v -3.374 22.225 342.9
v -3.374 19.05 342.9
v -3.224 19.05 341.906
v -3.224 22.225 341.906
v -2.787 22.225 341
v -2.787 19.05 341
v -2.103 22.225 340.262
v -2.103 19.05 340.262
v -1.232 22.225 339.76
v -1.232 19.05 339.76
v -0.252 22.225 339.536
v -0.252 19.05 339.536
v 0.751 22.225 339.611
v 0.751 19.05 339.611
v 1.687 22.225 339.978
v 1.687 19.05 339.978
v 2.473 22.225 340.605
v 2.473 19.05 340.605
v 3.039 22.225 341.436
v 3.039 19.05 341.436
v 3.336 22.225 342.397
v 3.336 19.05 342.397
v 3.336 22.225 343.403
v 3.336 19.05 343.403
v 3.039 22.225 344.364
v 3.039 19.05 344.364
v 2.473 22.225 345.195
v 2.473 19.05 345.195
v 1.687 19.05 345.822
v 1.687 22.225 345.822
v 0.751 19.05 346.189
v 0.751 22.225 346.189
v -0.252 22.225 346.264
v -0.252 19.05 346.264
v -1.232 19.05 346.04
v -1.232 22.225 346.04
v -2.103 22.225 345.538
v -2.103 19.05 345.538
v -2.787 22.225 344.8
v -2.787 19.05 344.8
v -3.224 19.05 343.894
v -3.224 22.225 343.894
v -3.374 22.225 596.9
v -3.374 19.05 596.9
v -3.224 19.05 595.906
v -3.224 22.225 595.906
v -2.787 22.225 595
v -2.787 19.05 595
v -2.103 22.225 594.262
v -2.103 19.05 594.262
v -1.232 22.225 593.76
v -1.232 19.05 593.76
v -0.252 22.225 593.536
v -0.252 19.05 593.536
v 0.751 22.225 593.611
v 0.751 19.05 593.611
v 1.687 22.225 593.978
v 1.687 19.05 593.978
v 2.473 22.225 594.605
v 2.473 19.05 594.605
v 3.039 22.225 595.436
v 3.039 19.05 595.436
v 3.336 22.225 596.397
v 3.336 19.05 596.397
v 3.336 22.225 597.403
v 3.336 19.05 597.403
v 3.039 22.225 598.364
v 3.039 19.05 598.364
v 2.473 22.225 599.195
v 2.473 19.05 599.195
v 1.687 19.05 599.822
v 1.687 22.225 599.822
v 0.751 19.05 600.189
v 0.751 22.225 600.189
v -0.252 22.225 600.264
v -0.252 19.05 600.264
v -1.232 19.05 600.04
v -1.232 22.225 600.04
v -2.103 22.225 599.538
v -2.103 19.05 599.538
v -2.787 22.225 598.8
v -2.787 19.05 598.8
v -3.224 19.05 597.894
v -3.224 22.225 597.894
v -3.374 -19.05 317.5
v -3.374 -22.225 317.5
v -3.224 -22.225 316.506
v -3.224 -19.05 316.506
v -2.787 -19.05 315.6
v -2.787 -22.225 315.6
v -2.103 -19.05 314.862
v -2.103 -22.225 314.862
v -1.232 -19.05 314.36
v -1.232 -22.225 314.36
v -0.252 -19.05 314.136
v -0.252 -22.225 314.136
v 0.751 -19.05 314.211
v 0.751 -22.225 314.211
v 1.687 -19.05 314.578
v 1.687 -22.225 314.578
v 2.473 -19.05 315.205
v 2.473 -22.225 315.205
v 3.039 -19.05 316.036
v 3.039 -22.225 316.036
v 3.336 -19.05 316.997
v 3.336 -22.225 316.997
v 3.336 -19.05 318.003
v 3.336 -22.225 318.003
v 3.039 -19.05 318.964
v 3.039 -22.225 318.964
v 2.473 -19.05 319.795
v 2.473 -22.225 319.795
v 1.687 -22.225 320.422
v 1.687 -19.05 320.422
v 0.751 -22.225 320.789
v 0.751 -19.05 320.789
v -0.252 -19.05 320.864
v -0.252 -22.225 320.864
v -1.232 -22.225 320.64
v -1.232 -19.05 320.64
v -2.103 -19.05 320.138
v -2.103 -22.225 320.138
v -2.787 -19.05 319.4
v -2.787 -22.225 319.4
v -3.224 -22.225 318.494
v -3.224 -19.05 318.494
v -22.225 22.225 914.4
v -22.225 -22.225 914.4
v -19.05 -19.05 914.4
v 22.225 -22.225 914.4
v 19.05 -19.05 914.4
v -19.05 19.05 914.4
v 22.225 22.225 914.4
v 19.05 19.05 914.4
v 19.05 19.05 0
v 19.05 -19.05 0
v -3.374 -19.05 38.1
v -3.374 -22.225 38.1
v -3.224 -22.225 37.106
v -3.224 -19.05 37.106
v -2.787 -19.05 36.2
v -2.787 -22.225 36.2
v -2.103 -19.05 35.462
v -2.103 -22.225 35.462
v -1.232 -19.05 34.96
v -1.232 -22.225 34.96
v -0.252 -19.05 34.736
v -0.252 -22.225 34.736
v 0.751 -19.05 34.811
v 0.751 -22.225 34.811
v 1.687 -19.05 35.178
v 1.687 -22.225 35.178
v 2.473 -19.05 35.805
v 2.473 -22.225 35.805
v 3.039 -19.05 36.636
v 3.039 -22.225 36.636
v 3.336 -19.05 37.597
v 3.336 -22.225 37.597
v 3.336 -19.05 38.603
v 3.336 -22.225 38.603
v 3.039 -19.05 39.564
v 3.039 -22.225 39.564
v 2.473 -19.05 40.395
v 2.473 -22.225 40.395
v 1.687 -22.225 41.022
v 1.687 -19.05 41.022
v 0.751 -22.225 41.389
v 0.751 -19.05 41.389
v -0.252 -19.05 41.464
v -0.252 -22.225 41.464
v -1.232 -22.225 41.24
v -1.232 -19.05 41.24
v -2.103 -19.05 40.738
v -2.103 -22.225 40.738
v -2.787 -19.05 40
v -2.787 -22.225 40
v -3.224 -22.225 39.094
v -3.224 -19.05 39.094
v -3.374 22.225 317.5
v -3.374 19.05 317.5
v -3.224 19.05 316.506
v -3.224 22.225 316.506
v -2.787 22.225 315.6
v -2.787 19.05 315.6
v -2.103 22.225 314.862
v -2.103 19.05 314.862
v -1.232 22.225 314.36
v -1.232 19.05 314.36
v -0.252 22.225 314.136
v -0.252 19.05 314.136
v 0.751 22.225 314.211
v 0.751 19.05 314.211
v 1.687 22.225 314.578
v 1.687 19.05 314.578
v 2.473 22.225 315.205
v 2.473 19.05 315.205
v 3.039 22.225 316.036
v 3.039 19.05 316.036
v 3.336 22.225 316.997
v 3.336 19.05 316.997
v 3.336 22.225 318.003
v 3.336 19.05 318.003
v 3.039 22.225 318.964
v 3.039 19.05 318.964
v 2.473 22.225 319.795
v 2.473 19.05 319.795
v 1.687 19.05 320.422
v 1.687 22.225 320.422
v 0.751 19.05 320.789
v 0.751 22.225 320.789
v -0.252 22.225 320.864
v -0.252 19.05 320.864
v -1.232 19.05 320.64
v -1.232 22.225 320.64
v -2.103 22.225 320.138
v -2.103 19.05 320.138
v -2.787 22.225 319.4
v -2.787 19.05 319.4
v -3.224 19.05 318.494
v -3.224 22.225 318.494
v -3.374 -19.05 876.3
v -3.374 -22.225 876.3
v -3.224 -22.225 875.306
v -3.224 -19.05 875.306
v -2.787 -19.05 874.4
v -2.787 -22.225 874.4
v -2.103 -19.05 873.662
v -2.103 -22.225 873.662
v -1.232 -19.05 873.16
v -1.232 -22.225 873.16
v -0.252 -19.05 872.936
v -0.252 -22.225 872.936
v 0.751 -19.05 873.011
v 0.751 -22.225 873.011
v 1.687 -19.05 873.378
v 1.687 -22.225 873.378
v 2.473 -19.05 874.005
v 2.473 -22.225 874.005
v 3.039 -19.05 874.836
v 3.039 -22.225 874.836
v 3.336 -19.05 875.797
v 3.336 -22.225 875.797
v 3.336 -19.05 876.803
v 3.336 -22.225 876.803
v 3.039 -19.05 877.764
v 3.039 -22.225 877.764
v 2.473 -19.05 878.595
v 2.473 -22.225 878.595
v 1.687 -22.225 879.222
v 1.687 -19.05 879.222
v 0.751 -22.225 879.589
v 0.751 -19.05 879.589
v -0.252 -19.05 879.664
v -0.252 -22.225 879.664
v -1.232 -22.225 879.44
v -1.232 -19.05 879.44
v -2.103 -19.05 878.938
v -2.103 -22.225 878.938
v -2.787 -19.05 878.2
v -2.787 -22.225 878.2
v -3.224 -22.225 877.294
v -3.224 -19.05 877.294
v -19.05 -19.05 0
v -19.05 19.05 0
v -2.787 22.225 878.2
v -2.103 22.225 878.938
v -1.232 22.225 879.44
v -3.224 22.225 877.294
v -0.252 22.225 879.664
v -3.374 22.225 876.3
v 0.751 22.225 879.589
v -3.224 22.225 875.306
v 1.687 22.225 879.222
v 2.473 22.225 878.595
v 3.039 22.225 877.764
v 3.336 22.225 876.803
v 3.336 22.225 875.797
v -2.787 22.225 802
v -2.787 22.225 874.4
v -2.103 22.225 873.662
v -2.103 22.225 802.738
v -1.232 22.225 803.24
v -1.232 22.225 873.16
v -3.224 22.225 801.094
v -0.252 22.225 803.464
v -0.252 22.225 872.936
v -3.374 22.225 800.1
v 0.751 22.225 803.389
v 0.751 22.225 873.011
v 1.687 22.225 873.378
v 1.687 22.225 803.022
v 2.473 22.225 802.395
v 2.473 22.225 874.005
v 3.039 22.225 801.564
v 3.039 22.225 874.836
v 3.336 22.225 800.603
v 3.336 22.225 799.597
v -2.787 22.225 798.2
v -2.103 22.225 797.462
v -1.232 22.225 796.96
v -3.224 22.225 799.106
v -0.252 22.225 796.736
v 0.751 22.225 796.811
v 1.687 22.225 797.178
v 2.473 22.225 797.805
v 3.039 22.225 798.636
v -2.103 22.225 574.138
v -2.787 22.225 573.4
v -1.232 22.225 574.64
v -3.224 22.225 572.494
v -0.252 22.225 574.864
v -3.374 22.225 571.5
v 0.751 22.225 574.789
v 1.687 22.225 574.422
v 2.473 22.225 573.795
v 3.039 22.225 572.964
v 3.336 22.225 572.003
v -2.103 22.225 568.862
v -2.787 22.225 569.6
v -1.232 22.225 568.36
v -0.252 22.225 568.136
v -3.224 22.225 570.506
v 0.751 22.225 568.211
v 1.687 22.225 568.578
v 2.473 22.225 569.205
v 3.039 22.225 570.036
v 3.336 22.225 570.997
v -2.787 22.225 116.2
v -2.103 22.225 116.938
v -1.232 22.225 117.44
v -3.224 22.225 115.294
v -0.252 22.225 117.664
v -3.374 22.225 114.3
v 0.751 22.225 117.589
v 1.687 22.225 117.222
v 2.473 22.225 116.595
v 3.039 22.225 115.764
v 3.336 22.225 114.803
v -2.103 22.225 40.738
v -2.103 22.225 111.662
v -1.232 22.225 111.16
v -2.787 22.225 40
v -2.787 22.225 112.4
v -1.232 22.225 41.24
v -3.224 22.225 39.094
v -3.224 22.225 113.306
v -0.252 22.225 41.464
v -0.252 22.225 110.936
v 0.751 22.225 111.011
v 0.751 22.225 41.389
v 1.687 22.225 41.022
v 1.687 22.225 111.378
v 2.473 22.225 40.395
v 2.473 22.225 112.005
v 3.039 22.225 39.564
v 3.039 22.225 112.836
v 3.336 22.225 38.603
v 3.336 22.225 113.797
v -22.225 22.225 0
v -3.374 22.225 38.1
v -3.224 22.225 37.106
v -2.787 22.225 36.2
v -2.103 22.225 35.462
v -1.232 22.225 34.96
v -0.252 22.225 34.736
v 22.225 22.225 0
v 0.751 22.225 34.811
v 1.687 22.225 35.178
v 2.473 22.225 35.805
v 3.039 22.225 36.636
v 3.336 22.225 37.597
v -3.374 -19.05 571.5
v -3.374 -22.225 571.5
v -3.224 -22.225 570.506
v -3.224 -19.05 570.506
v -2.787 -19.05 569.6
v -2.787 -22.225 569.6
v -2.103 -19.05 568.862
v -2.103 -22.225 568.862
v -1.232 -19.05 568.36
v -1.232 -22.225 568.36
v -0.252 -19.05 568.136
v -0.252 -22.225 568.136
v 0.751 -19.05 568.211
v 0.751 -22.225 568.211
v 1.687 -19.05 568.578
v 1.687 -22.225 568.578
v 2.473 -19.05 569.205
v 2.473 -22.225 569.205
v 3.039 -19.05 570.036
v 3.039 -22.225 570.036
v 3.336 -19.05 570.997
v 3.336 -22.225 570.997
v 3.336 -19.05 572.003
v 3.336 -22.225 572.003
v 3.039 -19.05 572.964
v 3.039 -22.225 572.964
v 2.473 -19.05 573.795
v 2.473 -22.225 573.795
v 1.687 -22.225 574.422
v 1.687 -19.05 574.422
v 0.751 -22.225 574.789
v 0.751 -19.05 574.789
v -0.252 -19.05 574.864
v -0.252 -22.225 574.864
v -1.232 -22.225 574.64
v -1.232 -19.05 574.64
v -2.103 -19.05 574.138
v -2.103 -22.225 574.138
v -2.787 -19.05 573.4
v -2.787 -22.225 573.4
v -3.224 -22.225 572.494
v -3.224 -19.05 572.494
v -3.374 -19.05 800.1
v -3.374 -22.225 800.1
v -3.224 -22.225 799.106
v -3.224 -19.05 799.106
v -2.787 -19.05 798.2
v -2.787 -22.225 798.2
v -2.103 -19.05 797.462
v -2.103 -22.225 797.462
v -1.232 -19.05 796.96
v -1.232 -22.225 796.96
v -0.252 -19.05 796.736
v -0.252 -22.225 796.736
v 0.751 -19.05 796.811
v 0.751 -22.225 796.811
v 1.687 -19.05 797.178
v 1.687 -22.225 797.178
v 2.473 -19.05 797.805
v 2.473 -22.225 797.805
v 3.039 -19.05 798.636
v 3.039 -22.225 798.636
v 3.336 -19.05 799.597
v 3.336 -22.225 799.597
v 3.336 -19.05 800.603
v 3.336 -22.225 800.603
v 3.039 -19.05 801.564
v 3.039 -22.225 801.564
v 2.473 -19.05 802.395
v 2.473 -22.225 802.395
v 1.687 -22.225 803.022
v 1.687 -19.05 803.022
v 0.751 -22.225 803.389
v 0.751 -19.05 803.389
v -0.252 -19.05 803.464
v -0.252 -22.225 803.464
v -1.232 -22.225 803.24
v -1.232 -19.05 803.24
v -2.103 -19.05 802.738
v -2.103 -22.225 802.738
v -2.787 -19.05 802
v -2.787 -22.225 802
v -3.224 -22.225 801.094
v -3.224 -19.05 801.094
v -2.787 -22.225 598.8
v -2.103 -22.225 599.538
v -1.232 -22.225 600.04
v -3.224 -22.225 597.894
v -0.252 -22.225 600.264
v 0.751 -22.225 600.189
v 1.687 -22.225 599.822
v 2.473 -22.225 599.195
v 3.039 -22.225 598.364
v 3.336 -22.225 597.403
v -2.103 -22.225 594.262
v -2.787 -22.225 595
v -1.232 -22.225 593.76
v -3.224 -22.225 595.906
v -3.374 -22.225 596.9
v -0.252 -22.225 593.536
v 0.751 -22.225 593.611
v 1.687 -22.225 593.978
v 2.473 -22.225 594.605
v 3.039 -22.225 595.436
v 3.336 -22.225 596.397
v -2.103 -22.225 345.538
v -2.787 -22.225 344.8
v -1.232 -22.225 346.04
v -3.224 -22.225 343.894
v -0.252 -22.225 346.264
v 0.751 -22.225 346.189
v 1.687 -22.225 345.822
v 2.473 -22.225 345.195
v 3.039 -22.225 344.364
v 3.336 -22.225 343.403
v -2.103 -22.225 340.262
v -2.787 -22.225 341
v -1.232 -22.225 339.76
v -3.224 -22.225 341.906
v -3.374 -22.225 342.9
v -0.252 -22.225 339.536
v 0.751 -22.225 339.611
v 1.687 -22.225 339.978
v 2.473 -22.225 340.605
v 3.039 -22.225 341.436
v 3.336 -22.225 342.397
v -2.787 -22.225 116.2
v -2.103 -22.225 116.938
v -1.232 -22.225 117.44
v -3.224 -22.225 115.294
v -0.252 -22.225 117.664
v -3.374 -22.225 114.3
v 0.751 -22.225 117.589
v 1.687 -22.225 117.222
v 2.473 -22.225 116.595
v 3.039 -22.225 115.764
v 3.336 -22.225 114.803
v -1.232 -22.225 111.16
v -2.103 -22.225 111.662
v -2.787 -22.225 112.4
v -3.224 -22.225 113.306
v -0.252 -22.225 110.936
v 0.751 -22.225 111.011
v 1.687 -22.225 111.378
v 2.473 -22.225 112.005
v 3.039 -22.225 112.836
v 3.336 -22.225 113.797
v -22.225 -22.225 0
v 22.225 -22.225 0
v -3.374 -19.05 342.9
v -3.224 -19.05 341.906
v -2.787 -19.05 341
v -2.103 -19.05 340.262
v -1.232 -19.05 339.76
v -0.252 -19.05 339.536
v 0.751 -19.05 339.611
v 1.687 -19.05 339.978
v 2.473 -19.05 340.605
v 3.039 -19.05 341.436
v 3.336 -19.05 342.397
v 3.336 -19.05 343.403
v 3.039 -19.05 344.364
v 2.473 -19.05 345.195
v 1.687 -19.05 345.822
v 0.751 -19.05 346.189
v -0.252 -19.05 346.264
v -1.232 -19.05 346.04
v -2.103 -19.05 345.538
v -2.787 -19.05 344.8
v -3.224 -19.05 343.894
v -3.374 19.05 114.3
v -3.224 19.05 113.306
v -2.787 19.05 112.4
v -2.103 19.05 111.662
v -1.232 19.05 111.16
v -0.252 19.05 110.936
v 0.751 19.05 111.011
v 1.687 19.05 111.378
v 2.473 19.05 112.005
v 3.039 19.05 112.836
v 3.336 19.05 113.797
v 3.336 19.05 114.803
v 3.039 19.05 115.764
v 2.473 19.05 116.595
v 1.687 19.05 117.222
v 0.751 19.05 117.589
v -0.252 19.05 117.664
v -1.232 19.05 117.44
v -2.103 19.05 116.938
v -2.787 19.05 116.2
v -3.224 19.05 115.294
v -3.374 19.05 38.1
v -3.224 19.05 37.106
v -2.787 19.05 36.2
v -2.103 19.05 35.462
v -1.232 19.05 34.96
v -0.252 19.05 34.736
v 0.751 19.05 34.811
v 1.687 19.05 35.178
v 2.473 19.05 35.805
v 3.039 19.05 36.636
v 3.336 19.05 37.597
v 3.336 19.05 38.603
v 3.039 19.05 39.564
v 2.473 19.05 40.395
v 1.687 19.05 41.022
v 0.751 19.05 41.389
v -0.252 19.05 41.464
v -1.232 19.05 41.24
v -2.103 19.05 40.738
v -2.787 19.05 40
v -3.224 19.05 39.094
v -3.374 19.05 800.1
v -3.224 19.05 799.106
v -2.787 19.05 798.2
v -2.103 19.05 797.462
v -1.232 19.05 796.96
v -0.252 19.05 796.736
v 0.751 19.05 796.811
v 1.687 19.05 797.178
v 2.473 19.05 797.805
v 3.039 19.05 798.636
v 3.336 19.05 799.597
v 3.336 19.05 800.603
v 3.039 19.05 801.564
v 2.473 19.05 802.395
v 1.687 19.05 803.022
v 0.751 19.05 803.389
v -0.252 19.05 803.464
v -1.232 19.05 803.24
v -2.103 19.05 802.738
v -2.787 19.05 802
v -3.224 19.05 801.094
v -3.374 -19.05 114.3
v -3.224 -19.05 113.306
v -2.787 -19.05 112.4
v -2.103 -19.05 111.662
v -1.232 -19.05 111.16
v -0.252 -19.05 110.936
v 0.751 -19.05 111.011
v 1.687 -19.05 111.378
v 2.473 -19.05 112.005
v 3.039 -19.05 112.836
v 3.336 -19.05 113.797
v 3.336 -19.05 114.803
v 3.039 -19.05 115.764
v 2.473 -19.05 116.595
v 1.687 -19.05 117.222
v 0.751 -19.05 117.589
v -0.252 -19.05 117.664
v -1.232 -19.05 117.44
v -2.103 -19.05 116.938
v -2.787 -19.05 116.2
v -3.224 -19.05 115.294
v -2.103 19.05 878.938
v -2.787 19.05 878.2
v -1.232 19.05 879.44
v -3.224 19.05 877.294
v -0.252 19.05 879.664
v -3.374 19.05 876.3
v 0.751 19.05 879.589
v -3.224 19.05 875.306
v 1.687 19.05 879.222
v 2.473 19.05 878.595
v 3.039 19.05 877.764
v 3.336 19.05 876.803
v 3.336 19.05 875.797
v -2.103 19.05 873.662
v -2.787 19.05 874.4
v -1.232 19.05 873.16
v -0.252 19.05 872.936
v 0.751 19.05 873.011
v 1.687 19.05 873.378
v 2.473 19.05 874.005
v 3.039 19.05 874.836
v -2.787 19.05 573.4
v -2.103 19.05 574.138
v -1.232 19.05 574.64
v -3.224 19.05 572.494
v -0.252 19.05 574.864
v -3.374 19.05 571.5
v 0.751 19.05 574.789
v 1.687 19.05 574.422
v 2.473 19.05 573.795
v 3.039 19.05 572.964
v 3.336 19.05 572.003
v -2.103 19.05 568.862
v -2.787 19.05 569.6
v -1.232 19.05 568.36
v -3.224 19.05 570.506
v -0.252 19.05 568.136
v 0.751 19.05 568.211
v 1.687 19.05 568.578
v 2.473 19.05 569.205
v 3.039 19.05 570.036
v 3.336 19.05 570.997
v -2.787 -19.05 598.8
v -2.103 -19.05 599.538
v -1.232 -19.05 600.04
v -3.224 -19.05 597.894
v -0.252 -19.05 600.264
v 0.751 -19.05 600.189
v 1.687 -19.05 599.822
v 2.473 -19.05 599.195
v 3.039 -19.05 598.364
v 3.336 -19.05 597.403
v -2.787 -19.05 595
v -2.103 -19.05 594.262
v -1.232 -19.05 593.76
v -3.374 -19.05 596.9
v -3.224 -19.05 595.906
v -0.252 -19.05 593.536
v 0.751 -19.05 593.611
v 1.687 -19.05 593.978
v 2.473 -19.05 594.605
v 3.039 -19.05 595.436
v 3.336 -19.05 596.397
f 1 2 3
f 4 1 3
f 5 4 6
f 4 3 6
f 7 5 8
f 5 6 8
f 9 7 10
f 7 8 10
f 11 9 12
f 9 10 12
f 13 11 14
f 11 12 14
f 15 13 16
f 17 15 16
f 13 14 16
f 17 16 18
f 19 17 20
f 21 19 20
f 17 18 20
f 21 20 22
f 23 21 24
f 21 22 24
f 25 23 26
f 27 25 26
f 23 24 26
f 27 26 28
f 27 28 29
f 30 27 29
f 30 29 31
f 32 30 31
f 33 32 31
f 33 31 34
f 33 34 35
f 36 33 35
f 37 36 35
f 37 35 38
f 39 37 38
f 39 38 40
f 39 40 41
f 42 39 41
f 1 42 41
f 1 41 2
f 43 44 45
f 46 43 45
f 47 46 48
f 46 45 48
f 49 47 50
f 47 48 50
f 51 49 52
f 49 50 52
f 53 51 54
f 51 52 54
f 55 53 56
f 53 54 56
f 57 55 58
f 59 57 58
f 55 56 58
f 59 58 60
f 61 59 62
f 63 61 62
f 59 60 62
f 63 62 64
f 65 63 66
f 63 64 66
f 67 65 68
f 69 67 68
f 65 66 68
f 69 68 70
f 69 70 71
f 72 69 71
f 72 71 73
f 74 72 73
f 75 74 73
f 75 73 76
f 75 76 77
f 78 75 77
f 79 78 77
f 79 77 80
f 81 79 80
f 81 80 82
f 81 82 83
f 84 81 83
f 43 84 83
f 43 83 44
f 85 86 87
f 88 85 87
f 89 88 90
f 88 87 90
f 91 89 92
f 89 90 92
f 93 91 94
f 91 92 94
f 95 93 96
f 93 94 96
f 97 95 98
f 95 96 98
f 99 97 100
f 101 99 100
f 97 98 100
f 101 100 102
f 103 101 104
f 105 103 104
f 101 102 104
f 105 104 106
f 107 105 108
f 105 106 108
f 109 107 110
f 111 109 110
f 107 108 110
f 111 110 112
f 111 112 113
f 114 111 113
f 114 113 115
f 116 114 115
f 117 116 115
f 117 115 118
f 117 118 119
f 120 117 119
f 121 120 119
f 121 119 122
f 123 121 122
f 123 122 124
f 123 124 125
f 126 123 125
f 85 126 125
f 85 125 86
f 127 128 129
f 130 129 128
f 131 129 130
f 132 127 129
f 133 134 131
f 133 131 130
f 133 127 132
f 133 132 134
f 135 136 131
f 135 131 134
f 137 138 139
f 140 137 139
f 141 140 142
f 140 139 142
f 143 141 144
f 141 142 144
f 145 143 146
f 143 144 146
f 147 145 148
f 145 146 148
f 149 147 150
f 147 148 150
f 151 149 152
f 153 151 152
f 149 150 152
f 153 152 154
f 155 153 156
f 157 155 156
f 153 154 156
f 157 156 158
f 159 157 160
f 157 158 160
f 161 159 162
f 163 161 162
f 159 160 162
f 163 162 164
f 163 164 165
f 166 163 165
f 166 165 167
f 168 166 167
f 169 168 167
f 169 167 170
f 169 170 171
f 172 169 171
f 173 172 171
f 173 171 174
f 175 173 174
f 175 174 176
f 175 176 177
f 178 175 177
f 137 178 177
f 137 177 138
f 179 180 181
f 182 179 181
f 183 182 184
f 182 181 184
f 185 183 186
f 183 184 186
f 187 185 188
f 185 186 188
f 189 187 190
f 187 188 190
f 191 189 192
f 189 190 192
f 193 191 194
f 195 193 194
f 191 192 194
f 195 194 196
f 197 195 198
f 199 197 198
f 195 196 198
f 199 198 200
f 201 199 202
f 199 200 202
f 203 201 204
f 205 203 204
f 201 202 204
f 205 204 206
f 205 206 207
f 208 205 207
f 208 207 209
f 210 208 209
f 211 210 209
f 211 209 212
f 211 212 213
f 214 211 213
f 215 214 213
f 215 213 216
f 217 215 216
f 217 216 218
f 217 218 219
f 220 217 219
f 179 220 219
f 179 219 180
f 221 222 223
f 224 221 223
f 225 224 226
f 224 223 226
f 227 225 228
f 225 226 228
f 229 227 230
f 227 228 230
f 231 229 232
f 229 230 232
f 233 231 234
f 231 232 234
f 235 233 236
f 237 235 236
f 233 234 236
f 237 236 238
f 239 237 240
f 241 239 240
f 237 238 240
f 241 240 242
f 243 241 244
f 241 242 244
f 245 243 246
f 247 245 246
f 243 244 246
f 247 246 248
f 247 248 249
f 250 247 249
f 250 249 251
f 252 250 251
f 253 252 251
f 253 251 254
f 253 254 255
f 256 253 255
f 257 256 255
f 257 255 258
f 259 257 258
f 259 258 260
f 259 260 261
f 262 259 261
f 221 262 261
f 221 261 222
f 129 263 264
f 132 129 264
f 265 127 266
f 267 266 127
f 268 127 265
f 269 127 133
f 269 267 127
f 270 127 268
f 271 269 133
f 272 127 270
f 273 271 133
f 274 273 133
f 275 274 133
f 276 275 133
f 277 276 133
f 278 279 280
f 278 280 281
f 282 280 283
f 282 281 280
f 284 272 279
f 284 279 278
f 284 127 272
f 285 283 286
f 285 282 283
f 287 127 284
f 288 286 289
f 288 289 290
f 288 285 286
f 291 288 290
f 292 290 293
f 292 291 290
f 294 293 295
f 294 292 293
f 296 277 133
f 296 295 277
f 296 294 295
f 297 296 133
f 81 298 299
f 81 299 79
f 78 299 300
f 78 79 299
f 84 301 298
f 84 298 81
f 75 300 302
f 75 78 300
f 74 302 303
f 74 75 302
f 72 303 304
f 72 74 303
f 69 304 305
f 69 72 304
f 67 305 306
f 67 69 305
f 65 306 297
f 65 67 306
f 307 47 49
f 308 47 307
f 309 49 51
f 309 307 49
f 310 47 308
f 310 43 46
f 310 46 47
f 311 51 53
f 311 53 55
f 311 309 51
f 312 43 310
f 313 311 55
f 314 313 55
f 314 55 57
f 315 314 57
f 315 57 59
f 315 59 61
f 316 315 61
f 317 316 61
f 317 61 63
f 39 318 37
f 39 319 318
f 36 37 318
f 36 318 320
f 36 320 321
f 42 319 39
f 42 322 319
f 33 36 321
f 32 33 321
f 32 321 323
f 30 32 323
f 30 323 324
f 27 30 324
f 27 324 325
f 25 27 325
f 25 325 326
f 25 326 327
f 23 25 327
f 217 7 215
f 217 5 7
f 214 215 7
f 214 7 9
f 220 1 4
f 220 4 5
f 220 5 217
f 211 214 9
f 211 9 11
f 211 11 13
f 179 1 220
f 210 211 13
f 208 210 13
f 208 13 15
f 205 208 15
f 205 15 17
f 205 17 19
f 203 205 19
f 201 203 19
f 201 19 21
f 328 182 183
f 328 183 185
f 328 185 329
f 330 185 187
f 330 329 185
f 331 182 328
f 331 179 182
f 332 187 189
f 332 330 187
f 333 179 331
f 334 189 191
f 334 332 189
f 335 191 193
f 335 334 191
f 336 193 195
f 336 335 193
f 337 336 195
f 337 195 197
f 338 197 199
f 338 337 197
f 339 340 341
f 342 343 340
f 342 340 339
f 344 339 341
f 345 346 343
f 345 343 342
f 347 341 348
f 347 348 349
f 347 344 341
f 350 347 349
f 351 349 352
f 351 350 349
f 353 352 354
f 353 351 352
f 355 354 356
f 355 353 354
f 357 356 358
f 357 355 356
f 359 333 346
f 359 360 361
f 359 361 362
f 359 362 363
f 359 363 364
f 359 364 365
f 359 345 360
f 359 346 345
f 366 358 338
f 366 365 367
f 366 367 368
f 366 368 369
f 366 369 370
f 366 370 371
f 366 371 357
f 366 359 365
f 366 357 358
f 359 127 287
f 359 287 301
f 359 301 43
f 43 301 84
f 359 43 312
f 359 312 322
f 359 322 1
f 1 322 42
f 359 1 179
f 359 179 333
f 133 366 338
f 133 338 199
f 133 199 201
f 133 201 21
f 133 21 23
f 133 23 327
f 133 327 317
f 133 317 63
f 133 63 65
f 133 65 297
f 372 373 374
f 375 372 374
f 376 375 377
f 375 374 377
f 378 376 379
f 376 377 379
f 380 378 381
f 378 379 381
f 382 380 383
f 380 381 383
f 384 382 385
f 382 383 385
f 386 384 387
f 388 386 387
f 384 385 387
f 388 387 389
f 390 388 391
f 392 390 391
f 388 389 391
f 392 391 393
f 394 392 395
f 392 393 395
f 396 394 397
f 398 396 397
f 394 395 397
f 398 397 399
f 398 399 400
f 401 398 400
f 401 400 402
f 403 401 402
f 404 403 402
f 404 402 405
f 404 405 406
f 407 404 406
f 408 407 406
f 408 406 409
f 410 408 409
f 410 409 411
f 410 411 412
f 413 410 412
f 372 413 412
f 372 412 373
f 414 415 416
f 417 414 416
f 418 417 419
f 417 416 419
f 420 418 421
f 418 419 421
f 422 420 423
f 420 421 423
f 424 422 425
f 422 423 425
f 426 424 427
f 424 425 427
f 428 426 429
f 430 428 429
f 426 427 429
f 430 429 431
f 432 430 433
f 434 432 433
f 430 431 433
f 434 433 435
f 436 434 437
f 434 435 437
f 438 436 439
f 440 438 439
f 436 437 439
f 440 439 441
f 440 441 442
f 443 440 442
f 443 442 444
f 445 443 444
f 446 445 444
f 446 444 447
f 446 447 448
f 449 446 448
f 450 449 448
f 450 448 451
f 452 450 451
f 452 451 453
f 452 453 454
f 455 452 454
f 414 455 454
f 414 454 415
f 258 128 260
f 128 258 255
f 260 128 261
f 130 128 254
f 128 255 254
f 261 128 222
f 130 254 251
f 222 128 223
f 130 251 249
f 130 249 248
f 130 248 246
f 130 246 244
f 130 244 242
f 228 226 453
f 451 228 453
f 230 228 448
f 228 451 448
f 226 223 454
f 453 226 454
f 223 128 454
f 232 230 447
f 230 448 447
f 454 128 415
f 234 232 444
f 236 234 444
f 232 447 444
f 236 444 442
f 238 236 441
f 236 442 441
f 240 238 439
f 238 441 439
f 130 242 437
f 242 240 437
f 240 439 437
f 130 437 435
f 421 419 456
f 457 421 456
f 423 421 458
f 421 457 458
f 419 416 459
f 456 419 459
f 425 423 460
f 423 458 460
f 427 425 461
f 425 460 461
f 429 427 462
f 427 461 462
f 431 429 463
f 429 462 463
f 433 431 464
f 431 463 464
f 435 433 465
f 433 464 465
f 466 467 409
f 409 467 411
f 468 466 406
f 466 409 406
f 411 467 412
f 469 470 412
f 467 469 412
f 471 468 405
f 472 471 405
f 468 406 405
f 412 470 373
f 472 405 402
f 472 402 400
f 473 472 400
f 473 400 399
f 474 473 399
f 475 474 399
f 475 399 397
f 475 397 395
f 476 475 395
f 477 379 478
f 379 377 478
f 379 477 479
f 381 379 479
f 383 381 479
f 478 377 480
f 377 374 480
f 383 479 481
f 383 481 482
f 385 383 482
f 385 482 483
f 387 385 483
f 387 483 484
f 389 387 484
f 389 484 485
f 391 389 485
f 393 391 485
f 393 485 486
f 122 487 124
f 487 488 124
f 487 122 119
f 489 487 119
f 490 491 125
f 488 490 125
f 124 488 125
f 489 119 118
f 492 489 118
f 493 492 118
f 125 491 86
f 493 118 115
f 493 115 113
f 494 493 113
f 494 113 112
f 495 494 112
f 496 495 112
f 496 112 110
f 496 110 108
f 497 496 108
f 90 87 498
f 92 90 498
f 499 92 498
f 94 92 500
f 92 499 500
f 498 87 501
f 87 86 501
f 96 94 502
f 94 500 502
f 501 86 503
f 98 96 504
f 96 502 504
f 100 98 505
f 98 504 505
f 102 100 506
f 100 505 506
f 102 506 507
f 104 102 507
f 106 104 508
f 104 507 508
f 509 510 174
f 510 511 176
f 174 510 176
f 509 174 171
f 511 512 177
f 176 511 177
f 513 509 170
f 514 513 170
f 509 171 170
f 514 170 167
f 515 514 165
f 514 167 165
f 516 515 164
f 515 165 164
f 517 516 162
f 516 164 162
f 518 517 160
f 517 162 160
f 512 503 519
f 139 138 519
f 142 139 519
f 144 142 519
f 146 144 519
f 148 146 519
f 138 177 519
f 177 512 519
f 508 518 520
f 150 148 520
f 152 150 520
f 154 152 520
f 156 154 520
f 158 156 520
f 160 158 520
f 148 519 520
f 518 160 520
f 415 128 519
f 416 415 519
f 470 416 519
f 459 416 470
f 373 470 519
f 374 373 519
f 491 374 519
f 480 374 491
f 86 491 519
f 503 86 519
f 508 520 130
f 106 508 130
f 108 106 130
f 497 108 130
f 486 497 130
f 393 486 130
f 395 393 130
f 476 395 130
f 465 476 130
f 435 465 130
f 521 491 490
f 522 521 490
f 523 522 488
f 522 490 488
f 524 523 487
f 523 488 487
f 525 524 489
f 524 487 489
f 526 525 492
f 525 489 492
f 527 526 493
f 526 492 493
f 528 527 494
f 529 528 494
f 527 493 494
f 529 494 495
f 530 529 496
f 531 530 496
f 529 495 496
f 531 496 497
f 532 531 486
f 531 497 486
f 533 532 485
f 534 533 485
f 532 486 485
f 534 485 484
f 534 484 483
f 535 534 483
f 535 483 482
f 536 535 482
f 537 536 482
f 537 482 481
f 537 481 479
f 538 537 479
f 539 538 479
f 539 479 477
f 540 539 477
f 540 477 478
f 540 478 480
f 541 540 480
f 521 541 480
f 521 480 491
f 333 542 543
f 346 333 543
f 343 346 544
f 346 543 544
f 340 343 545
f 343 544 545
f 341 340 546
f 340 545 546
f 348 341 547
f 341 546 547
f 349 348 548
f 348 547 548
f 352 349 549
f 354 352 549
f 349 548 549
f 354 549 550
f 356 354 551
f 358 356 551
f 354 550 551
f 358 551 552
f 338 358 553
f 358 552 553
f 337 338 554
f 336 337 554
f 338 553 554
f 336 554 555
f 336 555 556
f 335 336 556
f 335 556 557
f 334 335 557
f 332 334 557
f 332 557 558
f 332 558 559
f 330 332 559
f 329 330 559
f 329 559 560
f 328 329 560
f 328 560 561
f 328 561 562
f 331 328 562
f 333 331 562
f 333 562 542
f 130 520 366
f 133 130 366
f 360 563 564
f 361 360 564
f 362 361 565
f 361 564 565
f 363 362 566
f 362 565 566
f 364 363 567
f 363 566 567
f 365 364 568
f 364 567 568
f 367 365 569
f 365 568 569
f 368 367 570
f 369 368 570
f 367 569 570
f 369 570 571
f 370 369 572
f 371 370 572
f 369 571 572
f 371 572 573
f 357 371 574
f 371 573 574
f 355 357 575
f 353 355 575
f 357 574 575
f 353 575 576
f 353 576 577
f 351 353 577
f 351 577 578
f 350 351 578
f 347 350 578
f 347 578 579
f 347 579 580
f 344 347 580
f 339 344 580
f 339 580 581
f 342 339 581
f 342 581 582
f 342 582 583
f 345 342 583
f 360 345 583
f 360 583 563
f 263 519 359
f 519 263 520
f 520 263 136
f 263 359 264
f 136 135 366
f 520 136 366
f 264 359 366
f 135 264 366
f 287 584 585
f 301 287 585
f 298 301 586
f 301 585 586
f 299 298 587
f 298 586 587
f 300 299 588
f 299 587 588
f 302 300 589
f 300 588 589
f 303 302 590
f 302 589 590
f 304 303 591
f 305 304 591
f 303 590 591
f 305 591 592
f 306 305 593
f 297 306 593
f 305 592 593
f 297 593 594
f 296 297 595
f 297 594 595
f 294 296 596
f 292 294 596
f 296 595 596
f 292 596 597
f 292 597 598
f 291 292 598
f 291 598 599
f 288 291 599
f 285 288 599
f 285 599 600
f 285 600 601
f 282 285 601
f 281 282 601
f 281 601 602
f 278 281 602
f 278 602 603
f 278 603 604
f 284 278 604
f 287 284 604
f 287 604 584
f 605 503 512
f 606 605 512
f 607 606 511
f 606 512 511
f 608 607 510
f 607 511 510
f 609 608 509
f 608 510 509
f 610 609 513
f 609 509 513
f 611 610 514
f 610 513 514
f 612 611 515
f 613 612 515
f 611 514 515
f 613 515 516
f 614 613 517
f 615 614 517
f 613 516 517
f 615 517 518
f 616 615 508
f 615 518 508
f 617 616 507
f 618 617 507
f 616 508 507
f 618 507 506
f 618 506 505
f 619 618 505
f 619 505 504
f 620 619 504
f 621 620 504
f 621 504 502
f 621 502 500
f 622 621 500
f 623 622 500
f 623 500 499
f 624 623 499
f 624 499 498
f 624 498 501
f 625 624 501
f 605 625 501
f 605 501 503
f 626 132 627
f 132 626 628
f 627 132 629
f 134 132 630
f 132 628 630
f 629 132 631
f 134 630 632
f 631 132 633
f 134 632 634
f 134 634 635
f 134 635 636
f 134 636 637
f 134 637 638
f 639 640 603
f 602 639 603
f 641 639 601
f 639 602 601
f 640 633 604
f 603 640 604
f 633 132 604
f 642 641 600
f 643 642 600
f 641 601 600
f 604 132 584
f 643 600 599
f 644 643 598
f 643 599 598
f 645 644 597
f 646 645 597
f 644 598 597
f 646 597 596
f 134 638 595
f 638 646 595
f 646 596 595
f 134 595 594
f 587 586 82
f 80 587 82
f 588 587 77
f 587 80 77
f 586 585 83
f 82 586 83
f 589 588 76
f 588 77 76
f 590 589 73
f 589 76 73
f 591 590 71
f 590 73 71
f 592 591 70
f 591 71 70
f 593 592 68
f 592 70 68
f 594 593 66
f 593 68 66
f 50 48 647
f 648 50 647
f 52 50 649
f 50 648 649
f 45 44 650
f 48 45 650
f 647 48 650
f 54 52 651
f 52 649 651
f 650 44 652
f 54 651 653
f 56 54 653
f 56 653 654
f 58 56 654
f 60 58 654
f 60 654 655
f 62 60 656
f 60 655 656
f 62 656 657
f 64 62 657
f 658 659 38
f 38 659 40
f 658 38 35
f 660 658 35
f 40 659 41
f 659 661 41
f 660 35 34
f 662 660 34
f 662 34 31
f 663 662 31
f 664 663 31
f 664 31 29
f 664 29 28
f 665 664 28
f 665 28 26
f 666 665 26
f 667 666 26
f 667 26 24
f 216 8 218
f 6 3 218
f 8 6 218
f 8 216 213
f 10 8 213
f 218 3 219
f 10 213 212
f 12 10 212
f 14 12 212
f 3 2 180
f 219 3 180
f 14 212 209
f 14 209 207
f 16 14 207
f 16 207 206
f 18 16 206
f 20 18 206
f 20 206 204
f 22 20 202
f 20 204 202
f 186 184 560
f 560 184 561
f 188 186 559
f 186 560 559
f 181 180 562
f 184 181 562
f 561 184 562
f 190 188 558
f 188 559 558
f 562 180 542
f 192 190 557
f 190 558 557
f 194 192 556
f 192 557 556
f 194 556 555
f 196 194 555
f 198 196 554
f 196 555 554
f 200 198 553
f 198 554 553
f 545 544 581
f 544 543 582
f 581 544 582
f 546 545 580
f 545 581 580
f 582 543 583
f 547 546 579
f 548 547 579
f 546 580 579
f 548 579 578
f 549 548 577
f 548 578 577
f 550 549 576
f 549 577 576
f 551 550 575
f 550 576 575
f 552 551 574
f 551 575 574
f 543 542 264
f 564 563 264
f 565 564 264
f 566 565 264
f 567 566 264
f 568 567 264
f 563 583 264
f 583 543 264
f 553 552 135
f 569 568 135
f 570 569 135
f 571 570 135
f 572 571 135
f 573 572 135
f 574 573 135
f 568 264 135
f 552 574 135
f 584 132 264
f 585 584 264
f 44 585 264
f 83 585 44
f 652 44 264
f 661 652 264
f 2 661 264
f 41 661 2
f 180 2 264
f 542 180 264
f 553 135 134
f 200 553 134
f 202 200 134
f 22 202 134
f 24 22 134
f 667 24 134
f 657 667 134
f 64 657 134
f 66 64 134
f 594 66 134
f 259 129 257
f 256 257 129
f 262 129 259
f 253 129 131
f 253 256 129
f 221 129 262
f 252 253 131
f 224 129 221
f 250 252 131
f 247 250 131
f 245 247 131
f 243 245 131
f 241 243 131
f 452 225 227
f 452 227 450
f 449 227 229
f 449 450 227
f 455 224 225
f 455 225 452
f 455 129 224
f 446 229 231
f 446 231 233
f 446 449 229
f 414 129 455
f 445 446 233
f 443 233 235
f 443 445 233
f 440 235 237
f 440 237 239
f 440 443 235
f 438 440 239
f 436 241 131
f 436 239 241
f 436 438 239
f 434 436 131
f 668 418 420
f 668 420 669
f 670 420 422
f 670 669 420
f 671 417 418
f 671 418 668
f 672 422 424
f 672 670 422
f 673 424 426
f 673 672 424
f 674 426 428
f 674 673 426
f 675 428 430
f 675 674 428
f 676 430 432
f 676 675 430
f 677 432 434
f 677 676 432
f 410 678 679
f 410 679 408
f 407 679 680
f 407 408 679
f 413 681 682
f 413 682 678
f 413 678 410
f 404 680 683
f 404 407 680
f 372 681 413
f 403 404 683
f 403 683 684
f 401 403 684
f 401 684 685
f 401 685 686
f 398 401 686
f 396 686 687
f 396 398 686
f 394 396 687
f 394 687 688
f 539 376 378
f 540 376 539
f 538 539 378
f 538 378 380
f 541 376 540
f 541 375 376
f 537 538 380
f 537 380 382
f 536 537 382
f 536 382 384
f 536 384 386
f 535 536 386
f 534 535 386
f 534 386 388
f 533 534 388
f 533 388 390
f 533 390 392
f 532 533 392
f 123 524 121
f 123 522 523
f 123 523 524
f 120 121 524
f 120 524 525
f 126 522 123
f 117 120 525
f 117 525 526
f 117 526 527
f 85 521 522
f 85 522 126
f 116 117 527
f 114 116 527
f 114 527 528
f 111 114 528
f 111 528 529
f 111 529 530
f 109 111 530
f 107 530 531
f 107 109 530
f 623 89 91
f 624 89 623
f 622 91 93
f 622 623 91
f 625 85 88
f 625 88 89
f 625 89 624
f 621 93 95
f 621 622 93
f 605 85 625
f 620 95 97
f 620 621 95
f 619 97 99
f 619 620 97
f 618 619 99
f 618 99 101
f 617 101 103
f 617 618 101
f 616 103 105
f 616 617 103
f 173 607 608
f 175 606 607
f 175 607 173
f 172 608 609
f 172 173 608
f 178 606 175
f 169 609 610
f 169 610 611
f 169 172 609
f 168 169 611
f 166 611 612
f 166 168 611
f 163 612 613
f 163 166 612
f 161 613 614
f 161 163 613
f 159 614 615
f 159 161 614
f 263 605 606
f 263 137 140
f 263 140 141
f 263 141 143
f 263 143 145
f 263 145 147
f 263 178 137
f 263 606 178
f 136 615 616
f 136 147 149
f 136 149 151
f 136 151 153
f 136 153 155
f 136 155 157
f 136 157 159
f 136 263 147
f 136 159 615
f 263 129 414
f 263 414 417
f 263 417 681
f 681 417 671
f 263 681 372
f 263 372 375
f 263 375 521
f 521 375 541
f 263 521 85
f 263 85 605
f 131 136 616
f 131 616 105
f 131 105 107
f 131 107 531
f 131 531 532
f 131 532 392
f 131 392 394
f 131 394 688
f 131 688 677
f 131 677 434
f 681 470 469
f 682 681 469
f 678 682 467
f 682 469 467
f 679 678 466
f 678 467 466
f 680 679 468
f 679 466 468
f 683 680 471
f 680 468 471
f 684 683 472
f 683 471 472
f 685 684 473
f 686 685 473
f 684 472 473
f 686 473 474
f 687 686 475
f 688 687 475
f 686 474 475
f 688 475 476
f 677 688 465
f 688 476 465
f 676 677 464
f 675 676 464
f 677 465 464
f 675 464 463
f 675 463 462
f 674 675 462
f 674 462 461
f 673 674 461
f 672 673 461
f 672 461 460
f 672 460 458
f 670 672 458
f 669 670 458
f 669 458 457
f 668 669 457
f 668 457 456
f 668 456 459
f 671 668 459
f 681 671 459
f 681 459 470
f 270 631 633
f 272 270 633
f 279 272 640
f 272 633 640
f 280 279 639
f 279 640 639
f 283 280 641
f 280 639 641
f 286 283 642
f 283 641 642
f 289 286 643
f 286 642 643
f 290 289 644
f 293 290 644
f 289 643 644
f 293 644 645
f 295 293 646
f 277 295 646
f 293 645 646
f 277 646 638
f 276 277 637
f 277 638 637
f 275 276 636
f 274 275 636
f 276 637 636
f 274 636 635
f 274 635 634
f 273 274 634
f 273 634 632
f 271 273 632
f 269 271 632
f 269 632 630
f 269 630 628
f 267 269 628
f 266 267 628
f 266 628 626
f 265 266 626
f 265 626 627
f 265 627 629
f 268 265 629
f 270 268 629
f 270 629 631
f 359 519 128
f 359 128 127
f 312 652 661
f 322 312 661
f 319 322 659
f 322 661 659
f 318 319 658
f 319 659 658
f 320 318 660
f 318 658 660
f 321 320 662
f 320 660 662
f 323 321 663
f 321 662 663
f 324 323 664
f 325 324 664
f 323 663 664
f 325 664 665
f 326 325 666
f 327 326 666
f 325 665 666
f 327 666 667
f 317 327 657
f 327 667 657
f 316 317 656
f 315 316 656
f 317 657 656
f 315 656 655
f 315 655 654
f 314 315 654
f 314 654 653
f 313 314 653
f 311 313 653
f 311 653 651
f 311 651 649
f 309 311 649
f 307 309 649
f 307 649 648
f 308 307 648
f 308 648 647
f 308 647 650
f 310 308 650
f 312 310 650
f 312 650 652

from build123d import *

# Parameters (mm, degrees)
SKETCH1_W                        = 44.45
SKETCH1_H                        = 44.45
SKETCH1_W_2                      = 38.1
SKETCH1_H_2                      = 38.1
BOSS_EXTRUDE1_DEPTH              = 914.4
F_17_64_0_26563_DIAMETER_HOLE1_D = 6.747002


with BuildPart() as part:
    # Sketch1 → Boss-Extrude1 (new body)
    with BuildSketch(Plane.XY):
        Rectangle(SKETCH1_W, SKETCH1_H)
        Rectangle(SKETCH1_W_2, SKETCH1_H_2, mode=Mode.SUBTRACT)
    extrude(amount=BOSS_EXTRUDE1_DEPTH)

    # 17/64 (0.26563) Diameter Hole1 (through all)
    with Locations(Plane(origin=(0, 22.225, 0), x_dir=(1, 0, 0), z_dir=(0, 1, 0))):
        with Locations((0, -38.1), (0, -876.3), (0, -317.5), (0, -596.9), (0, -114.3), (0, -342.9), (0, -571.5), (0, -800.1)):
            Hole(F_17_64_0_26563_DIAMETER_HOLE1_D / 2)


solid = part.part
